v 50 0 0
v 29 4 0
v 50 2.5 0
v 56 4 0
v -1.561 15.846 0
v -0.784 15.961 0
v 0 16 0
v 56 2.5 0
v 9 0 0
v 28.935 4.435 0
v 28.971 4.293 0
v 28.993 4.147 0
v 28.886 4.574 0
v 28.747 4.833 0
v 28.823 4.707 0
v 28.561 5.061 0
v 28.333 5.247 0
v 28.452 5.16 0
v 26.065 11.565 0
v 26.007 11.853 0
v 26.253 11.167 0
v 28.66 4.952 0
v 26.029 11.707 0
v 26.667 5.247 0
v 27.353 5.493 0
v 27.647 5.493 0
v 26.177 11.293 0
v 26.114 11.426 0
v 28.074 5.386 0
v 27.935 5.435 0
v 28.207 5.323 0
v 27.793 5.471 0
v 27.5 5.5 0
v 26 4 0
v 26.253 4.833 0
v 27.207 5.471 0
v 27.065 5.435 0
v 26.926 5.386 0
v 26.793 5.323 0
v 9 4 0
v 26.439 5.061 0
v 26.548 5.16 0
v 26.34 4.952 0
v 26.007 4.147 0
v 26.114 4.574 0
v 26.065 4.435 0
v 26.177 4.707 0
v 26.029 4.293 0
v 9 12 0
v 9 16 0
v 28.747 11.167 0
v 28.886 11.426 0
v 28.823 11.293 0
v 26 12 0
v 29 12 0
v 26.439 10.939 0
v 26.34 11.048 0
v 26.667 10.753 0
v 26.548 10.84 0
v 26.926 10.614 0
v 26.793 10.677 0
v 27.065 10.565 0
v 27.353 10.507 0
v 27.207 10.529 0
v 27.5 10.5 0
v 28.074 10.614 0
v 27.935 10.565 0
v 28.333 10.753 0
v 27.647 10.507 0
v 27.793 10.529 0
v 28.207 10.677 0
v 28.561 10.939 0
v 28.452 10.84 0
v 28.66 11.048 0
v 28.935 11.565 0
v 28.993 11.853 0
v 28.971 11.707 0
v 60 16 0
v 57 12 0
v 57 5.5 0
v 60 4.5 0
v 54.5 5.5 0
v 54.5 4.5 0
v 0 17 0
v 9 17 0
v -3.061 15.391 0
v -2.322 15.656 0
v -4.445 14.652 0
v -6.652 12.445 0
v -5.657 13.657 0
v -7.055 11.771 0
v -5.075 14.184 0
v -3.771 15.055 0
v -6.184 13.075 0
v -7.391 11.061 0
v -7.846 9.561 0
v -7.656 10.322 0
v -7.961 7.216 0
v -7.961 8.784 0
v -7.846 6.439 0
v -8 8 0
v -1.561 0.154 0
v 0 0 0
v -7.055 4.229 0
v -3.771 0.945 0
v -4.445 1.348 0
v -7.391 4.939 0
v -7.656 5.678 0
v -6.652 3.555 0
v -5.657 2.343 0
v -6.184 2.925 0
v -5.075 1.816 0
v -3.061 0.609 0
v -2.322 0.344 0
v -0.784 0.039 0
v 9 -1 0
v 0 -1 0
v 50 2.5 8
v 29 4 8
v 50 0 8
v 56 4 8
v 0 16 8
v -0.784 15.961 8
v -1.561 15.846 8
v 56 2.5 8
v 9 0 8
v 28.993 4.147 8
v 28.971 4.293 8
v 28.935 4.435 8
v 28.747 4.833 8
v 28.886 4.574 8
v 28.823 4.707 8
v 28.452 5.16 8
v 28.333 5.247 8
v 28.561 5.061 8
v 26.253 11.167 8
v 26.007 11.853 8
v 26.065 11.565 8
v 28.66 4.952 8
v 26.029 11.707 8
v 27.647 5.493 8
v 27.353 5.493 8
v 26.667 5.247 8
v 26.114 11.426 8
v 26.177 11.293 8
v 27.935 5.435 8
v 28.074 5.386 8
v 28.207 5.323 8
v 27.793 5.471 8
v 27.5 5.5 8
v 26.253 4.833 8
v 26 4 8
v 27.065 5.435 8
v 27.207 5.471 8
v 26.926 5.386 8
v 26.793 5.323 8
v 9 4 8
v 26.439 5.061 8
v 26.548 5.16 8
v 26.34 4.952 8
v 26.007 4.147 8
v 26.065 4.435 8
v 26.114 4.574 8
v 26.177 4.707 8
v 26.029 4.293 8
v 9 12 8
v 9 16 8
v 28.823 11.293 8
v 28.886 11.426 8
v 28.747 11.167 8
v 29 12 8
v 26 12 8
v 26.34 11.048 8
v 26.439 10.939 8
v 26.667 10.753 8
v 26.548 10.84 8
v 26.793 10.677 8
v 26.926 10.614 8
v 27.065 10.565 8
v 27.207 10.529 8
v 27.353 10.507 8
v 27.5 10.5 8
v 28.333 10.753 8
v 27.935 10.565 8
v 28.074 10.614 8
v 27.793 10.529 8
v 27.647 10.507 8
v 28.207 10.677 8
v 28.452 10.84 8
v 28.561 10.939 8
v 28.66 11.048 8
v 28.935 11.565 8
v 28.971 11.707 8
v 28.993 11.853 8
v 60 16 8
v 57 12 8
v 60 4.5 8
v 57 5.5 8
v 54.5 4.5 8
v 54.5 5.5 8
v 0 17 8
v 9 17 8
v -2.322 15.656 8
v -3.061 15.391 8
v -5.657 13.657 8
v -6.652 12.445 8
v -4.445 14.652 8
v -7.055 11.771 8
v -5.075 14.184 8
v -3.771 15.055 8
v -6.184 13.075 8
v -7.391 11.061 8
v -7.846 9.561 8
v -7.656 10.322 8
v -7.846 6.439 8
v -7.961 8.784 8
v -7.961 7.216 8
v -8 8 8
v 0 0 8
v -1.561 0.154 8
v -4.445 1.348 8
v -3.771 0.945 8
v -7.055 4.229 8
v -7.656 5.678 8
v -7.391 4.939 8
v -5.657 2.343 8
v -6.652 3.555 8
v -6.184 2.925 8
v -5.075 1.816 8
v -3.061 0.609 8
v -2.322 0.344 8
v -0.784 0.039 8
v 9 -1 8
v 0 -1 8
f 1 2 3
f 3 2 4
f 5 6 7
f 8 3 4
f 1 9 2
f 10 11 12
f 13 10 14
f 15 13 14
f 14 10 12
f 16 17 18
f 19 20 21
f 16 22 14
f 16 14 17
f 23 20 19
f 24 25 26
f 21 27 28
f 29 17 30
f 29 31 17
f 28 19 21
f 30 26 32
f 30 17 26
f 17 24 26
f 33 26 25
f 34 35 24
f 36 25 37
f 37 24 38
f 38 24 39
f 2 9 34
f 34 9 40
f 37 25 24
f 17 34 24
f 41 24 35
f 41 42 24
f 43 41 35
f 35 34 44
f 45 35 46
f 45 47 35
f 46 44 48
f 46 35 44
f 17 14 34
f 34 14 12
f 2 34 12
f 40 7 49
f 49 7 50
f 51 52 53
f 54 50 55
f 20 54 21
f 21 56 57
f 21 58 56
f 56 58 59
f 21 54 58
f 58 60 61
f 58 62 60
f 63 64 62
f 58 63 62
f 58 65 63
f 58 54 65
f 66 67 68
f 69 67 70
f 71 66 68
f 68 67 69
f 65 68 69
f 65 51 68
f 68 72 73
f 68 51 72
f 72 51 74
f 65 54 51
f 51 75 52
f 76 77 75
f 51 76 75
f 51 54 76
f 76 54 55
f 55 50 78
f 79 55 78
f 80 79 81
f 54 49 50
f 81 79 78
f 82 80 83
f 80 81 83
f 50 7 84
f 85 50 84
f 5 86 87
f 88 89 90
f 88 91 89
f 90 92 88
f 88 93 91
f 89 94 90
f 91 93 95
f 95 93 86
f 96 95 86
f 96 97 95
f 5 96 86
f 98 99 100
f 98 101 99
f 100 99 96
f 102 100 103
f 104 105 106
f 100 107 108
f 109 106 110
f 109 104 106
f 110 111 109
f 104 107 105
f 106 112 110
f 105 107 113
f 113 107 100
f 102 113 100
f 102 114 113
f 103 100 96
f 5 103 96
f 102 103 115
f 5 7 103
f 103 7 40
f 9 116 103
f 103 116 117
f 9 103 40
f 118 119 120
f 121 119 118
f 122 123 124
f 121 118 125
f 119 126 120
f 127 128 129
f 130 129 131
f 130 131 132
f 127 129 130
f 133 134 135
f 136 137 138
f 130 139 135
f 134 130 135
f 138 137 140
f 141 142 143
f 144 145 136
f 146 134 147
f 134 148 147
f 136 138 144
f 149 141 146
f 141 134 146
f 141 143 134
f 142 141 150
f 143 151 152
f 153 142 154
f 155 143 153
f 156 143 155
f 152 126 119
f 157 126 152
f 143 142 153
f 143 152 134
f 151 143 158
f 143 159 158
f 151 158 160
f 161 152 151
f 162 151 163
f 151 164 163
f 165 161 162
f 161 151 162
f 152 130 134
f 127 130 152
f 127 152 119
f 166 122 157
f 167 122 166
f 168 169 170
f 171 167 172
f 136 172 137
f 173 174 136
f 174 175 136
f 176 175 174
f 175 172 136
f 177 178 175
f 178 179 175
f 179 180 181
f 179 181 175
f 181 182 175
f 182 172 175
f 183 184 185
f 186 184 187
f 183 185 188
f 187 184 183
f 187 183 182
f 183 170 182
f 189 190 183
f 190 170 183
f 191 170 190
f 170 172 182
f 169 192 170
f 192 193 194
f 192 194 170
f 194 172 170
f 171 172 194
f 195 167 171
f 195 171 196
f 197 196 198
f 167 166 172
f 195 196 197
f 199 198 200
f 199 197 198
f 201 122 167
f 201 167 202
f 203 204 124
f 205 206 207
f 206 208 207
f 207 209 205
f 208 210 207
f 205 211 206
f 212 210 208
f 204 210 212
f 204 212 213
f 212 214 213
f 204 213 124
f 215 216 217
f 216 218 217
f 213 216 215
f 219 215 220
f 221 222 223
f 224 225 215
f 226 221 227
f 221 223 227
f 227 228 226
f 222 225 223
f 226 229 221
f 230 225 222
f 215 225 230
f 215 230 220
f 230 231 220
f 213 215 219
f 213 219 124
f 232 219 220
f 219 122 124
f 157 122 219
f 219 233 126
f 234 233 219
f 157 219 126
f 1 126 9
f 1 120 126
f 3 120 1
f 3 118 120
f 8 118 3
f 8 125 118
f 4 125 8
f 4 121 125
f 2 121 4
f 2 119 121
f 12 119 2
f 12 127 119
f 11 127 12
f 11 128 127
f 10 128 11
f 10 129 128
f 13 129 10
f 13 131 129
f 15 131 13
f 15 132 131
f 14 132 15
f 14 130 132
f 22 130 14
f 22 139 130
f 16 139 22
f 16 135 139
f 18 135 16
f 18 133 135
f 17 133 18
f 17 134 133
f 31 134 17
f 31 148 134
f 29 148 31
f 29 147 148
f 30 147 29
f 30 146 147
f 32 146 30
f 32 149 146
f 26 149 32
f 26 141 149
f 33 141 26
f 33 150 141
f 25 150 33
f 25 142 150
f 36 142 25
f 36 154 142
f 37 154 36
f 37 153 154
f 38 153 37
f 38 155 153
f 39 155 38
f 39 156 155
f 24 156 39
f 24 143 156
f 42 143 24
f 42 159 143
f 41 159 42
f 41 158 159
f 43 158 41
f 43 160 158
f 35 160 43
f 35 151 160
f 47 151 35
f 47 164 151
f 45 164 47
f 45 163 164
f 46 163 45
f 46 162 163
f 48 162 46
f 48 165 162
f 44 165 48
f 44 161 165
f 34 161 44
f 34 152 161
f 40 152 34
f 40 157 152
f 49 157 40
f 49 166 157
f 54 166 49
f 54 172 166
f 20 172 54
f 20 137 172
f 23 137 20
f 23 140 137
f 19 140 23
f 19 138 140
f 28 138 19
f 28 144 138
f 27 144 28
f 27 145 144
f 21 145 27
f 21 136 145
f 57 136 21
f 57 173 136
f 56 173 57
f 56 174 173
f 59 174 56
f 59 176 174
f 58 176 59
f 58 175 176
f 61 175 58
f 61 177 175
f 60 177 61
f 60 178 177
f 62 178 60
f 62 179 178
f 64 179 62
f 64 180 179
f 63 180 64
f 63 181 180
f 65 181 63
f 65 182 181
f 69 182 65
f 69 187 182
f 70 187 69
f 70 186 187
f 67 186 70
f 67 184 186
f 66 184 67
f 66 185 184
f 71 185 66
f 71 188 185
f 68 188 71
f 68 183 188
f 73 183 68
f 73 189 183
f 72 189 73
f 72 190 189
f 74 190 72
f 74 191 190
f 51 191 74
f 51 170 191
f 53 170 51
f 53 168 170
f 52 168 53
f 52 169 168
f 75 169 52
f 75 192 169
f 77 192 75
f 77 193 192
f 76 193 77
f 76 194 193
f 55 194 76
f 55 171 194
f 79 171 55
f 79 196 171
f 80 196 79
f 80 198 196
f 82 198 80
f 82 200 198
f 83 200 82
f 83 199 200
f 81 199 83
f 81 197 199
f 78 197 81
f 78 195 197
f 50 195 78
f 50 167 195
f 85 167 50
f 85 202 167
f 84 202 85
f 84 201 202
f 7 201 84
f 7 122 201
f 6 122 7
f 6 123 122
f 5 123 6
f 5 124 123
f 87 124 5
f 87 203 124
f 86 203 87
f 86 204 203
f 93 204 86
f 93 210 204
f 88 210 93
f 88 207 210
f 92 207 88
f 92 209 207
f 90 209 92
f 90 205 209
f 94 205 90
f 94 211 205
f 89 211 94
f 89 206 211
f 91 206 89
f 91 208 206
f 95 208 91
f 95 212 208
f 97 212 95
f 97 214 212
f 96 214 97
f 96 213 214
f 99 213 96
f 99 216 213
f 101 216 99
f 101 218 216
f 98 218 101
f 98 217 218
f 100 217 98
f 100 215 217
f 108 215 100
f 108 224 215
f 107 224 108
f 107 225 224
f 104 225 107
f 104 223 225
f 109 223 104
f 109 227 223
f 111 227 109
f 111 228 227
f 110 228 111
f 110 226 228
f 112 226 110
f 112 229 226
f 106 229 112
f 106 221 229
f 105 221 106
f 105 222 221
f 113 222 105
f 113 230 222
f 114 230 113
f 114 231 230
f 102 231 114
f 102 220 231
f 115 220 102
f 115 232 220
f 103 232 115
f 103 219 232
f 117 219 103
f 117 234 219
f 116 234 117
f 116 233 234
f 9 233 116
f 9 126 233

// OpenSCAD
// Pinch clamp for silicone tubing (up to 6.4 mm across)
// Printed flat: 2-D profile in XY plane, extruded 8 mm along Z

// === Dimensions (mm) ===
extrusion_height = 8;          // Extrusion height along Z
lower_jaw_x_start = 0;         // Lower jaw x start
lower_jaw_x_end = 50;          // Lower jaw x end (before tongue)
lower_jaw_y_start = 0;         // Lower jaw y start
lower_jaw_y_end = 4;           // Lower jaw y end
tongue_x_start = 50;           // Tongue x start
tongue_x_end = 56;             // Tongue x end
tongue_y_start = 2.5;          // Tongue y start
tongue_y_end = 4;              // Tongue y end
upper_jaw_x_start = 0;         // Upper jaw x start
upper_jaw_x_end = 60;          // Upper jaw x end
upper_jaw_y_start = 12;        // Upper jaw y start
upper_jaw_y_end = 16;          // Upper jaw y end
hinge_center_x = 0;            // Hinge center x
hinge_center_y = 8;            // Hinge center y
hinge_inner_r = 7.2;           // Hinge inner radius
hinge_outer_r = 8;             // Hinge outer radius
ridge_radius = 1.5;            // Pinch ridge radius
ridge_x = 27.5;                // Ridge x position
lower_ridge_y = 4;             // Lower jaw ridge center y
upper_ridge_y = 12;            // Upper jaw ridge center y
latch_leg_x_start = 57;        // Latch leg x start
latch_leg_x_end = 60;          // Latch leg x end
latch_leg_y_start = 4.5;       // Latch leg y start
latch_leg_y_end = 12;          // Latch leg y end
latch_nose_x_start = 54.5;     // Latch nose x start
latch_nose_x_end = 57;         // Latch nose x end
latch_nose_y_start = 4.5;      // Latch nose y start
latch_nose_y_end = 5.5;        // Latch nose y end

$fn = 64;

linear_extrude(height = extrusion_height, convexity = 10) {
    union() {
        // Lower jaw bar
        translate([lower_jaw_x_start, lower_jaw_y_start])
            square([lower_jaw_x_end - lower_jaw_x_start, lower_jaw_y_end - lower_jaw_y_start]);

        // Tongue
        translate([tongue_x_start, tongue_y_start])
            square([tongue_x_end - tongue_x_start, tongue_y_end - tongue_y_start]);

        // Upper jaw bar
        translate([upper_jaw_x_start, upper_jaw_y_start])
            square([upper_jaw_x_end - upper_jaw_x_start, upper_jaw_y_end - upper_jaw_y_start]);

        // Hinge: half-ring on x < 0 side, centered at (0, 8)
        // Create full ring
        translate([hinge_center_x, hinge_center_y])
            circle(r = hinge_outer_r);
        translate([hinge_center_x, hinge_center_y])
            circle(r = hinge_inner_r);
        
        // Latch leg
        translate([latch_leg_x_start, latch_leg_y_start])
            square([latch_leg_x_end - latch_leg_x_start, latch_leg_y_end - latch_leg_y_start]);

        // Latch nose
        translate([latch_nose_x_start, latch_nose_y_start])
            square([latch_nose_x_end - latch_nose_x_start, latch_nose_y_end - latch_nose_y_start]);

        // Lower jaw pinch ridge: half-round on inner face (top side, facing upper jaw)
        // Semi-circle above y=4, centered at (ridge_x, 4)
        translate([ridge_x, lower_ridge_y])
            rotate([0, 0, 180])
            circle(r = ridge_radius);

        // Upper jaw pinch ridge: half-round on inner face (bottom side, facing lower jaw)
        // Semi-circle below y=12, centered at (ridge_x, 12)
        translate([ridge_x, upper_ridge_y])
            circle(r = ridge_radius);
    }

    // Cut out the right half of the hinge (x > 0) to leave only the left half-ring
    // The square extends slightly past the hinge to ensure clean cut
    translate([0, hinge_center_y - hinge_outer_r - 1])
        square([hinge_outer_r + 1, 2 * hinge_outer_r + 2]);
}
